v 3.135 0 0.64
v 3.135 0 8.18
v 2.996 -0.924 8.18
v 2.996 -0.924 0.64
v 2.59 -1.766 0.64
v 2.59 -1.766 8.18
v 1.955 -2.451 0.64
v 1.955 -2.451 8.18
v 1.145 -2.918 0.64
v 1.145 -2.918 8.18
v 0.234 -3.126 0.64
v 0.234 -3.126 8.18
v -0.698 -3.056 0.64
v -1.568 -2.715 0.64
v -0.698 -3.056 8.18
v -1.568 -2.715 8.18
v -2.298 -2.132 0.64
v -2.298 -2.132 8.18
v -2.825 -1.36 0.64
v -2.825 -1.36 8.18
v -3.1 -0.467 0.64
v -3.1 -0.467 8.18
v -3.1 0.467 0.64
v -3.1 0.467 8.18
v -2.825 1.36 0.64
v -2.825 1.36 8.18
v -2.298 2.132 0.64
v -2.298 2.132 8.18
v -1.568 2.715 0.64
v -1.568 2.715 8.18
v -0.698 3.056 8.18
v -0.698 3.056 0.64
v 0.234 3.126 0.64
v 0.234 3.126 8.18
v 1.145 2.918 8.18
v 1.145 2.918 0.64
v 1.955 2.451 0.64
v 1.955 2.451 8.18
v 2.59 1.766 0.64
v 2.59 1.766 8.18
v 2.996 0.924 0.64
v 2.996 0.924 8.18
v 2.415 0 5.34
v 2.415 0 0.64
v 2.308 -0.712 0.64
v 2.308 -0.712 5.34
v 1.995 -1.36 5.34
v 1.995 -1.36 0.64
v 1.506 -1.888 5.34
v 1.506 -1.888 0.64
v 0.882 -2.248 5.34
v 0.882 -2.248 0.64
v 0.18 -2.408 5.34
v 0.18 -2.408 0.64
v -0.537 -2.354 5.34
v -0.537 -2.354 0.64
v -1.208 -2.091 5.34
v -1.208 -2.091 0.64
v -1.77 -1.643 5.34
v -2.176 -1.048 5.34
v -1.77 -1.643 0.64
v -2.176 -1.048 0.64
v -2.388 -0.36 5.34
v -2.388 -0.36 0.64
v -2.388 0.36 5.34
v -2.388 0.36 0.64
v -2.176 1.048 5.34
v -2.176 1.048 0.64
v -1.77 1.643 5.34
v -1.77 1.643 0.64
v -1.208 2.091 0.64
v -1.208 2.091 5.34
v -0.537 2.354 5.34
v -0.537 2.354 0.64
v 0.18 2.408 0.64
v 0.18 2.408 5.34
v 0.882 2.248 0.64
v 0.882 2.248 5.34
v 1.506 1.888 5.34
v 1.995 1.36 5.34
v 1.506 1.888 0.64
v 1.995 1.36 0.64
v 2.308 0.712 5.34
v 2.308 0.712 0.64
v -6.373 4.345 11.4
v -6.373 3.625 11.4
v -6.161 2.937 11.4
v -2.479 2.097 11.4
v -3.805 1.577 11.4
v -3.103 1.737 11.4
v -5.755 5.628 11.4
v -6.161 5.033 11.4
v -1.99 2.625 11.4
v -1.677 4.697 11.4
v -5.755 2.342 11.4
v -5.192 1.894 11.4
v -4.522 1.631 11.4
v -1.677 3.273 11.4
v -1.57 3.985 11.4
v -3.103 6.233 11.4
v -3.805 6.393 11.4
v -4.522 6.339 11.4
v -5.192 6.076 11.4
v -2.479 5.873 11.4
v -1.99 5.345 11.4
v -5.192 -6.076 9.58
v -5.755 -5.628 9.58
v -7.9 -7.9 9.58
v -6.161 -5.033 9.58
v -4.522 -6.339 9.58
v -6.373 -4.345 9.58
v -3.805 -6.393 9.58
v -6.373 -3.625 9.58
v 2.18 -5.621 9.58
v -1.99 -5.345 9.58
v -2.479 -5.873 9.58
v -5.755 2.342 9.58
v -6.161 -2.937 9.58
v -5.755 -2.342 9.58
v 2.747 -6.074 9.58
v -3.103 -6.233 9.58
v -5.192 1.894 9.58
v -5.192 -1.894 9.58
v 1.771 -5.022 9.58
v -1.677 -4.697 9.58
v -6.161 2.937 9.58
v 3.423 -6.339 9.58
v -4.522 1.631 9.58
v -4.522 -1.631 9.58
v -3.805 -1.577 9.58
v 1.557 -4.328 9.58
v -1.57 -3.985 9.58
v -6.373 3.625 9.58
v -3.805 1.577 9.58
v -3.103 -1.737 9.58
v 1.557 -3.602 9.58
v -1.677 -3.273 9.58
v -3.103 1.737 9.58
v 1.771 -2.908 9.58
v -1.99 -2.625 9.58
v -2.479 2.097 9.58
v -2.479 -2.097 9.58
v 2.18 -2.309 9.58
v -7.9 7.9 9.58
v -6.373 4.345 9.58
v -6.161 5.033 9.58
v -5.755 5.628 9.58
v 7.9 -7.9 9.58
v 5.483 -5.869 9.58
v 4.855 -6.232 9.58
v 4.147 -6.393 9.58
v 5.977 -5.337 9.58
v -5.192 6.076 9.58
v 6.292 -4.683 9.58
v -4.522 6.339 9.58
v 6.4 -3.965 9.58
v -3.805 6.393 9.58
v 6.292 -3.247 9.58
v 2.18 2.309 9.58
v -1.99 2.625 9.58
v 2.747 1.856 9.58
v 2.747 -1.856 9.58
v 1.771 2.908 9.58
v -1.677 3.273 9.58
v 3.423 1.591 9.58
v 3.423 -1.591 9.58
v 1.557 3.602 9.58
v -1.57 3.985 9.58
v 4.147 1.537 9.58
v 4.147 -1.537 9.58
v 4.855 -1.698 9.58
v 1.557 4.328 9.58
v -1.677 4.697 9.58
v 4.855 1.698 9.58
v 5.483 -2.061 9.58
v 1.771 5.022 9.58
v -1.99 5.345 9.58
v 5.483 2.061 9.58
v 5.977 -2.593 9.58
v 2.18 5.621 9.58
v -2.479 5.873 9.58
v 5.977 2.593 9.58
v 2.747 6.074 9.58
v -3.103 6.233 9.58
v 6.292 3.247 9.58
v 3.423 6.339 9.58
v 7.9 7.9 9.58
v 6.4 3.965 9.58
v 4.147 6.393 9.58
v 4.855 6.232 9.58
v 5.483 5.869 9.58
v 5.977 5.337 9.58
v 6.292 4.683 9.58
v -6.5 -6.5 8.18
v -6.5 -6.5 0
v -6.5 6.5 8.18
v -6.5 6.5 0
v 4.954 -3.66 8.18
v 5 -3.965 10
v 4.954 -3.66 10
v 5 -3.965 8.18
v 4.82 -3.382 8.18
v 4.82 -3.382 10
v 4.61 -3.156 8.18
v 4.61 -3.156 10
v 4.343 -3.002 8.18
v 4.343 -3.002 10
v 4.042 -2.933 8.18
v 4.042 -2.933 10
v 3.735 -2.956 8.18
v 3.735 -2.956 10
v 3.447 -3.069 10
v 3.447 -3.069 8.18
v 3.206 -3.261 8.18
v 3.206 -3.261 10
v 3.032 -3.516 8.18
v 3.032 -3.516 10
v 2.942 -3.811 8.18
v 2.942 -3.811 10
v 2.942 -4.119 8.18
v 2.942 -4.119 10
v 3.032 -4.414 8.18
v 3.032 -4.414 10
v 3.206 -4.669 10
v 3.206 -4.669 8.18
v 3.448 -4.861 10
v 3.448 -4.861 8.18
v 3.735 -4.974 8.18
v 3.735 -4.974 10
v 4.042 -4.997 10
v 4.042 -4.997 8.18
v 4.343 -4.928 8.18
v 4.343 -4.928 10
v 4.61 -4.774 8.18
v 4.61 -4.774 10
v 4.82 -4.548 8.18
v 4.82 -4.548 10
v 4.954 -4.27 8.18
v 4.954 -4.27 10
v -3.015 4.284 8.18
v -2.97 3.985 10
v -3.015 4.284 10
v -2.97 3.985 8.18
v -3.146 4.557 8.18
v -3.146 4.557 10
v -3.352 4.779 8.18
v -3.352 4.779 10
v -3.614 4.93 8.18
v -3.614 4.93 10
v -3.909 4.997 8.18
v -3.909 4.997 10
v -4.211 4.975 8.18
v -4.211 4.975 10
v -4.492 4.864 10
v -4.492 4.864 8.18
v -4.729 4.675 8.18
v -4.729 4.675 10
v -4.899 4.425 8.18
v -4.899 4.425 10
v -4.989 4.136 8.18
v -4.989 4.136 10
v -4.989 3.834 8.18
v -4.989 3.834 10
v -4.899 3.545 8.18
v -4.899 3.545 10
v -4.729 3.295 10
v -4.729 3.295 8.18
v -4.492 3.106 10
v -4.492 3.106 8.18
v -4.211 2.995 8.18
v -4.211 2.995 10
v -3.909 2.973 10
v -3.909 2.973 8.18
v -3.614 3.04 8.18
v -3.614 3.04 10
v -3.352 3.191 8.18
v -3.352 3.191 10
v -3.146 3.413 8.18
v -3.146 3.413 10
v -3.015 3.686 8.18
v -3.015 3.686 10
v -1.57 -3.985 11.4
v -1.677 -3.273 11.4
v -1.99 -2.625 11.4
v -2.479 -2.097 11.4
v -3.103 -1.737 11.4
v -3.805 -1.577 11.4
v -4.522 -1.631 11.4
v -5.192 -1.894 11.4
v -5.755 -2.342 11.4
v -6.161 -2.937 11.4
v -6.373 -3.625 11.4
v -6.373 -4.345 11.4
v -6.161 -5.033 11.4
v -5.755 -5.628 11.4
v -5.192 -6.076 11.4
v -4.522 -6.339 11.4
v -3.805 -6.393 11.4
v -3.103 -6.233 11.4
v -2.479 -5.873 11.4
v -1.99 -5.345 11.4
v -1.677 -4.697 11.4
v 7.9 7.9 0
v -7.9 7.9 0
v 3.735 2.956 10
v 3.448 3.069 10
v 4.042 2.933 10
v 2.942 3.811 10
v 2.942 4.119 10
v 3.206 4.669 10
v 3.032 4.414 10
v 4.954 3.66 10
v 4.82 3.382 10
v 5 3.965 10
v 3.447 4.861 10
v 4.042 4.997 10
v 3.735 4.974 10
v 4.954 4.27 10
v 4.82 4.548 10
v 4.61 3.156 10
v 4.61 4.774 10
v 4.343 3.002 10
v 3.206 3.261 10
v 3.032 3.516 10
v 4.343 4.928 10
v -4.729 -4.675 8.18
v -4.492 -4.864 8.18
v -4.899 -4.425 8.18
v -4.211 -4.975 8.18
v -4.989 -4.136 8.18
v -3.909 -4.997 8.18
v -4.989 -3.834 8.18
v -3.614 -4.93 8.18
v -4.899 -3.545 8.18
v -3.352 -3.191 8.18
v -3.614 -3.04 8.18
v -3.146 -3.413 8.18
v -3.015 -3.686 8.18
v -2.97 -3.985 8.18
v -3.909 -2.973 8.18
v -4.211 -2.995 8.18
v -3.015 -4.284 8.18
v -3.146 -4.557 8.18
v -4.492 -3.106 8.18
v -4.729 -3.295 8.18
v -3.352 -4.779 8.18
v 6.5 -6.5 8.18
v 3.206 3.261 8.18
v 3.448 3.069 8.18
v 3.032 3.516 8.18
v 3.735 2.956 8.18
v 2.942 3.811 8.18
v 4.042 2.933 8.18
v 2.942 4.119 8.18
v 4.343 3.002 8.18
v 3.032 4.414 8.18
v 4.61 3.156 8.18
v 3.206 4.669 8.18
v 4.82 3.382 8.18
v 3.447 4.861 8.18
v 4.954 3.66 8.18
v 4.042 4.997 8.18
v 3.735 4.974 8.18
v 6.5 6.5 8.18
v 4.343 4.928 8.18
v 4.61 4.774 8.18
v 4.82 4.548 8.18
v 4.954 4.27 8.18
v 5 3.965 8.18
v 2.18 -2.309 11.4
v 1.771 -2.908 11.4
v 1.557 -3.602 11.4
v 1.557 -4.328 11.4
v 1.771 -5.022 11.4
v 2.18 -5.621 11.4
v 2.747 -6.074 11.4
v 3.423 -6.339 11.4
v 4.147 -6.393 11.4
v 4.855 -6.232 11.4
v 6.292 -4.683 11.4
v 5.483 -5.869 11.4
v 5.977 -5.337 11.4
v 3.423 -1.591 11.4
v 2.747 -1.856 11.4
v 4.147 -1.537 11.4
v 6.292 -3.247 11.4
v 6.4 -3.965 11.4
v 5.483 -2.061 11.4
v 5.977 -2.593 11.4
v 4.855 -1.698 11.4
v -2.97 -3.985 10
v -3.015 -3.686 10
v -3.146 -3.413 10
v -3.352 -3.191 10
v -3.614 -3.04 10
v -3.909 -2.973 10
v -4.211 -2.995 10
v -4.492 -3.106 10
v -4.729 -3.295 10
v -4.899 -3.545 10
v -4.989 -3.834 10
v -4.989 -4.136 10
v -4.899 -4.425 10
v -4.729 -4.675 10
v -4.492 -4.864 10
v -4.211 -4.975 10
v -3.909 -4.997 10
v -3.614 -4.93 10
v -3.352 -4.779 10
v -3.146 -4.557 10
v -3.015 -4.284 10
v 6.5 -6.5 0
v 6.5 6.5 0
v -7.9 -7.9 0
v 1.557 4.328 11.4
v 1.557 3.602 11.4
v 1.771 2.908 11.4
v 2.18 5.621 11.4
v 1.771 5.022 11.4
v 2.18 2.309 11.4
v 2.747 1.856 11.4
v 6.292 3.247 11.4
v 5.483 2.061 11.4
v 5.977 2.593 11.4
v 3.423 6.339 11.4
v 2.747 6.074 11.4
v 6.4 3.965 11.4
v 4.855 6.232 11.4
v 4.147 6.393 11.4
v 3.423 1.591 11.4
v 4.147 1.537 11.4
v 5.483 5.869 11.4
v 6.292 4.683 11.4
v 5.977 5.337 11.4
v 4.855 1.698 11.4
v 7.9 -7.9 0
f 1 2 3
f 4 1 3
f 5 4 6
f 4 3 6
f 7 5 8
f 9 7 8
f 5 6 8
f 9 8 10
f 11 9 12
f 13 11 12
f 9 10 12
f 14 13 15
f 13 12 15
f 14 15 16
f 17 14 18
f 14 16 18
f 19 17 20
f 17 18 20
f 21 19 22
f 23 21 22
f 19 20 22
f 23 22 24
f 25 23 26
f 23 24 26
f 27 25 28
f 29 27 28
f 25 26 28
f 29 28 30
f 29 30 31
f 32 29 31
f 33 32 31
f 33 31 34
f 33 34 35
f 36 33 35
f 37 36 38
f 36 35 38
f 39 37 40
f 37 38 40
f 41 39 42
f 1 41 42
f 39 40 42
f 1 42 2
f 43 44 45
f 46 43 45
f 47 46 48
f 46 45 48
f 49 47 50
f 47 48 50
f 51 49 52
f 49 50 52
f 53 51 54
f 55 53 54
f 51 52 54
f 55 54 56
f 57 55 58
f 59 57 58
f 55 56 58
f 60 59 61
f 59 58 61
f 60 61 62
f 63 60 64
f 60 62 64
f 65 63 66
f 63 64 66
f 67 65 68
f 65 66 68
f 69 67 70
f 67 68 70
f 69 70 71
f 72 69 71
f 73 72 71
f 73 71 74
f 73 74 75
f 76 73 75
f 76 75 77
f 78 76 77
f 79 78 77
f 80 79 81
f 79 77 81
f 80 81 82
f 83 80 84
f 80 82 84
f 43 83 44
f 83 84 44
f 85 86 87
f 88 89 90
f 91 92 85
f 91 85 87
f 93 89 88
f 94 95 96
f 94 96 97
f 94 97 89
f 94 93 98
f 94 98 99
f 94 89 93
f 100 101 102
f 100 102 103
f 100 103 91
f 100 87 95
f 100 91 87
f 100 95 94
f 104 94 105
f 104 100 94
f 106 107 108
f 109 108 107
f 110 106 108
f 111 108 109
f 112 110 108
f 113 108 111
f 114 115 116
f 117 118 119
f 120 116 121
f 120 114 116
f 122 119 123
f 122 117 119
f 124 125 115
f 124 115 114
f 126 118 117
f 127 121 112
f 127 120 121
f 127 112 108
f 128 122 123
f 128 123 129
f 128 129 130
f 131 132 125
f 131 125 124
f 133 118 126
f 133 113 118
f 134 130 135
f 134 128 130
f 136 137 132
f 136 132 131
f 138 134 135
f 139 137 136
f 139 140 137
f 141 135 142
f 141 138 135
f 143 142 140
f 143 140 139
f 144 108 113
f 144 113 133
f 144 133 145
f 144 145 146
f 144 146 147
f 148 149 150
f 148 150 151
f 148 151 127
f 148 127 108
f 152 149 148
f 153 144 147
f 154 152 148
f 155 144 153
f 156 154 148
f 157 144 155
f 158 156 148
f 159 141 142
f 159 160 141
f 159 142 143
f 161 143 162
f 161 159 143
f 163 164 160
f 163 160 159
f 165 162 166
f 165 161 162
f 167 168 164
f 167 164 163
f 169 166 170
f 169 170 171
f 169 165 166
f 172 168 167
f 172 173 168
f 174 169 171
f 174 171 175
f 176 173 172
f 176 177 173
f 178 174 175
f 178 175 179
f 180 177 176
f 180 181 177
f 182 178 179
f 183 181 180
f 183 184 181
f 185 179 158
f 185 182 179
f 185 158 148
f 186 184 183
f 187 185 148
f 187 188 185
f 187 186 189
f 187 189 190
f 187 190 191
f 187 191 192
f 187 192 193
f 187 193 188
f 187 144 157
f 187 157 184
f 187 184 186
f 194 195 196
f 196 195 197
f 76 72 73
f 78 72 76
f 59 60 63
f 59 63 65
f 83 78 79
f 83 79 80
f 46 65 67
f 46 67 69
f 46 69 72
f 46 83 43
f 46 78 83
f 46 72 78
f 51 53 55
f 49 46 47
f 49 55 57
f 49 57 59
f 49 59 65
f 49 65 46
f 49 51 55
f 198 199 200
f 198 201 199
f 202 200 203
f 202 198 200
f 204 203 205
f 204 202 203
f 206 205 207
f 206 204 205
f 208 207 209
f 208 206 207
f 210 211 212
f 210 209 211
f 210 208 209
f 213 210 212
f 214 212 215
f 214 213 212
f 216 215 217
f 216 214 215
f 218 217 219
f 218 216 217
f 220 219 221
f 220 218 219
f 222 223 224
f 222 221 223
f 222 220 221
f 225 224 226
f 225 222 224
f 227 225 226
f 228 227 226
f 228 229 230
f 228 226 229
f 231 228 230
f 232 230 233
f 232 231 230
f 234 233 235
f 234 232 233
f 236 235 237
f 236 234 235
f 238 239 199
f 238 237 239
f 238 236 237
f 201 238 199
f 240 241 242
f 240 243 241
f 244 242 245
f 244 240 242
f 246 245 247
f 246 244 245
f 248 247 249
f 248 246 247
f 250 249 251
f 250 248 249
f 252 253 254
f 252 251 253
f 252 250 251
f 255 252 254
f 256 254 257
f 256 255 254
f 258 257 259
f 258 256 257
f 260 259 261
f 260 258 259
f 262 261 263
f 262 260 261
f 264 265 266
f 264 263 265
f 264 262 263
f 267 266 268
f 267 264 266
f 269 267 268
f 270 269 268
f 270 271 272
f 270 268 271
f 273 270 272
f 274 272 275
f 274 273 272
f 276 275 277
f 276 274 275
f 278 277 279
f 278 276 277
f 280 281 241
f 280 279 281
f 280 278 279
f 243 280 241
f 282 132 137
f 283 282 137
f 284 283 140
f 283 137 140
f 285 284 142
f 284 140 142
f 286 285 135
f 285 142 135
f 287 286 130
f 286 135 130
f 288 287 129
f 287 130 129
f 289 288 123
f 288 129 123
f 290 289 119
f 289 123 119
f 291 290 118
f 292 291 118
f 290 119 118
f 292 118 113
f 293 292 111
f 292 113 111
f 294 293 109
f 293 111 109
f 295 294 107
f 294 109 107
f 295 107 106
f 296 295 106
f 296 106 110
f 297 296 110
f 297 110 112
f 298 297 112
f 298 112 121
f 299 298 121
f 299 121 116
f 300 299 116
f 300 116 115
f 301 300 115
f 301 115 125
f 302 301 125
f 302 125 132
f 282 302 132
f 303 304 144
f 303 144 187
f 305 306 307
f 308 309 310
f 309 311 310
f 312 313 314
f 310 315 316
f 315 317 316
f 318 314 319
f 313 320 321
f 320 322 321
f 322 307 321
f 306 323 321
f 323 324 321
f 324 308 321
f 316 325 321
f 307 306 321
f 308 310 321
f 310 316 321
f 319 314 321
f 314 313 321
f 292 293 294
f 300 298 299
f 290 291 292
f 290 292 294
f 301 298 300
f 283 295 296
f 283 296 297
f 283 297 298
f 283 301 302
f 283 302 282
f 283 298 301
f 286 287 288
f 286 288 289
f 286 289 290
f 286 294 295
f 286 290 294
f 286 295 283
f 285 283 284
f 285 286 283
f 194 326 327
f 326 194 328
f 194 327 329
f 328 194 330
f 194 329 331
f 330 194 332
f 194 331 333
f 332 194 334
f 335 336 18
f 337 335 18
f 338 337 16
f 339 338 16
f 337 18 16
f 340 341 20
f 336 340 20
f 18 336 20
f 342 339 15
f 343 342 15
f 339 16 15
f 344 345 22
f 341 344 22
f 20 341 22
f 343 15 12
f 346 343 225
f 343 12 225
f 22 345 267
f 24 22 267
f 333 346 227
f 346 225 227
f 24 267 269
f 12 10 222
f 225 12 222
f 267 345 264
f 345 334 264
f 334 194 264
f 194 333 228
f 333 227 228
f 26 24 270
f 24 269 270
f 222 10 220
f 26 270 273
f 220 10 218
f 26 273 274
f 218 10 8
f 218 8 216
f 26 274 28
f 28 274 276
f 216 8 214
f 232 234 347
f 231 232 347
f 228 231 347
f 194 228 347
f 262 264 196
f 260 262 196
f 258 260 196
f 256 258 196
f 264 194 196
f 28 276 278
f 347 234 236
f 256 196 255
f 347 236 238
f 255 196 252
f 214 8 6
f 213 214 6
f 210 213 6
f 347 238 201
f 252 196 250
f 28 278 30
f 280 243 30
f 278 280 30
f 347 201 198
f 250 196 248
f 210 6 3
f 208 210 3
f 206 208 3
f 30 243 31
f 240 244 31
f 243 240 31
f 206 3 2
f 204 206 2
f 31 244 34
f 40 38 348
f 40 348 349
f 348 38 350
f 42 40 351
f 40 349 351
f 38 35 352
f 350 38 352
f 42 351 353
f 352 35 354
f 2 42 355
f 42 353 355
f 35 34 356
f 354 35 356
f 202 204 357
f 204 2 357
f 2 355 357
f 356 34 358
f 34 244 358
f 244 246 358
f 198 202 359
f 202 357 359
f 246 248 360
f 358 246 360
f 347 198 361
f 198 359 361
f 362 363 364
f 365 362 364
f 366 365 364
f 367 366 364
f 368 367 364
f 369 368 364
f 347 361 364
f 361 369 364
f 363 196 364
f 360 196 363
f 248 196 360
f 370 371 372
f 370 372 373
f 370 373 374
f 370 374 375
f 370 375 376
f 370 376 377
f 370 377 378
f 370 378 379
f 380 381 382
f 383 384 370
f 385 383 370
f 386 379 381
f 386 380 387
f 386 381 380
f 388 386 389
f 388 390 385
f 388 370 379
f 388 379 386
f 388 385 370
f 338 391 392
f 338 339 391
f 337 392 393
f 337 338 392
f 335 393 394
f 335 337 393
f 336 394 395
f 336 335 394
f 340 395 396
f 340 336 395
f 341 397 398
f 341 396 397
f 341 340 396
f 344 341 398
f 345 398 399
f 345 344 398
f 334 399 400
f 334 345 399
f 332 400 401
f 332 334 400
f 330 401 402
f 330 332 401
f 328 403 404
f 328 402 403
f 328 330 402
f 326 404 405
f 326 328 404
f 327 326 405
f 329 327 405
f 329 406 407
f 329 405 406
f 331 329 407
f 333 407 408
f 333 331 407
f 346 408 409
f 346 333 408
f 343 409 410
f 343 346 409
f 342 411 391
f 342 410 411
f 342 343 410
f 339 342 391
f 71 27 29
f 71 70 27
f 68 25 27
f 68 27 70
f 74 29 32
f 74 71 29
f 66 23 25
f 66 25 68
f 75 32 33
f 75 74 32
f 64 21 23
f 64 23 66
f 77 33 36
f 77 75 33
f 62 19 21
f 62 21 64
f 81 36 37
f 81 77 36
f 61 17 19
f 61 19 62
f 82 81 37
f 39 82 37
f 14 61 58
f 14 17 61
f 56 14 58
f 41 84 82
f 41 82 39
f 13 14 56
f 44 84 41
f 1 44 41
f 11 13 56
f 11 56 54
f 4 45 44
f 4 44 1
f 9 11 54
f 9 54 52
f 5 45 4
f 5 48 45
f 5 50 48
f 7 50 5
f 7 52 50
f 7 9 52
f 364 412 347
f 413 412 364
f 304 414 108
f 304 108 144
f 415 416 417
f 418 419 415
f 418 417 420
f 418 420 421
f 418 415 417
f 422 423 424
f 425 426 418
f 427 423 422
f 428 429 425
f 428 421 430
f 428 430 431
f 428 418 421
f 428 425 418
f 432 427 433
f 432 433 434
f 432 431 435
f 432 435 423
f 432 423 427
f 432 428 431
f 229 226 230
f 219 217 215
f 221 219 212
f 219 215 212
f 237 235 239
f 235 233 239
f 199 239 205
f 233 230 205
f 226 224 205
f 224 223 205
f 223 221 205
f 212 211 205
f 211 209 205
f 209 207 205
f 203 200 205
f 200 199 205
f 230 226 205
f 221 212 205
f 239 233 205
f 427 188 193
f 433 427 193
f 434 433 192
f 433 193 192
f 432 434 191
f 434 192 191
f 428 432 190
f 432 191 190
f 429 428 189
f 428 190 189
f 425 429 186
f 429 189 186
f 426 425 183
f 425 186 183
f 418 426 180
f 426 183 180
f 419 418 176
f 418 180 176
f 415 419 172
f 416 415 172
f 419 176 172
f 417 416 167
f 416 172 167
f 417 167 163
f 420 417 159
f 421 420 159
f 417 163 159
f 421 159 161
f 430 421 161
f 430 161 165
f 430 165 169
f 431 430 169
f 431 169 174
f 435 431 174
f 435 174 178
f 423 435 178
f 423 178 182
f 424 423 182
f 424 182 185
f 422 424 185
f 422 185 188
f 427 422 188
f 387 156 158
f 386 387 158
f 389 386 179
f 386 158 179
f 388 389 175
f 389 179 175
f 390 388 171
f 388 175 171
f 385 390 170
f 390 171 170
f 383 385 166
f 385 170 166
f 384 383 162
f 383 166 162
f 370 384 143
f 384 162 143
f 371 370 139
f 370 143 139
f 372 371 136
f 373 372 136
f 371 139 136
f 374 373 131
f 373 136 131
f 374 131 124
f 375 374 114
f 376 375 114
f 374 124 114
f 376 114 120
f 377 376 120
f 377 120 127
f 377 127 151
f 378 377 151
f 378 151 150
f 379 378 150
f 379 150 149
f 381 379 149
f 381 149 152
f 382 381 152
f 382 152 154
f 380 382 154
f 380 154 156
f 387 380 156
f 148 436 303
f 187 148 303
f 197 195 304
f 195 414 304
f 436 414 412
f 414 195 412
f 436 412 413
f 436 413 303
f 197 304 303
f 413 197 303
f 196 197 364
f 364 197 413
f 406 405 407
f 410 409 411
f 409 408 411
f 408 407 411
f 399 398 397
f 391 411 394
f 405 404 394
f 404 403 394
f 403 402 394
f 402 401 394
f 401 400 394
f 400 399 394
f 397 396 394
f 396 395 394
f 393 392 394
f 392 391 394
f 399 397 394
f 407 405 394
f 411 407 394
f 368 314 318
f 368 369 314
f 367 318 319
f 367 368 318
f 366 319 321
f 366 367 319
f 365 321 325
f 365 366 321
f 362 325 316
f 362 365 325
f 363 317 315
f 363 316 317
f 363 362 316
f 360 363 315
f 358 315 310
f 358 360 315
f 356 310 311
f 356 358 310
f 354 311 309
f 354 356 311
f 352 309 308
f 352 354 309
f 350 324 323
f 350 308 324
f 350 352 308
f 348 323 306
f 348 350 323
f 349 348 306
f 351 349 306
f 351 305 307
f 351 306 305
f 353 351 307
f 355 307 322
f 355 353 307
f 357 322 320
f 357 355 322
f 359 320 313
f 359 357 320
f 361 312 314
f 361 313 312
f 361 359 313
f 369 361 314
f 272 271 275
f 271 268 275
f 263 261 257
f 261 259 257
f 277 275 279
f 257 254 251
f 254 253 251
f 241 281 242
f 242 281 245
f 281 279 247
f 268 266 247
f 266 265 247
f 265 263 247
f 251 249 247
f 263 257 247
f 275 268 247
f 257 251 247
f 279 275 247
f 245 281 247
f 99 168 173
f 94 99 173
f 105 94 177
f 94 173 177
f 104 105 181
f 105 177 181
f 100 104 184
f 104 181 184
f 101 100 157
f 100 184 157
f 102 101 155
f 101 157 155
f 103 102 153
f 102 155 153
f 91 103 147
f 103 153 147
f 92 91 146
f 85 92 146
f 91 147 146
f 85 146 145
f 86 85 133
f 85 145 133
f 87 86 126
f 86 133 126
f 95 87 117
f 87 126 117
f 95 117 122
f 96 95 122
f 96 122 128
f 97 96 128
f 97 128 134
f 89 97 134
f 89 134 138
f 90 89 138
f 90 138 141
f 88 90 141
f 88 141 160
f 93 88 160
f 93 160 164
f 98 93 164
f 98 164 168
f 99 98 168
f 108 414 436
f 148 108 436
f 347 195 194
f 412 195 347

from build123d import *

# Parameters (mm, degrees)
F1_W     = 15.8
F1_H     = 15.8
F2_DEPTH = 9.58
F0_R     = 2.4150125628
F0_R_2   = 2.435
F3_DEPTH = 11.4
F4_T     = -1.4
F5_R     = 3.135
F6_DEPTH = 7.54
F7_R     = 2.415
F8_DEPTH = 4.7


with BuildPart() as f2:
    # F1 (on Top) → F2 (new body)
    with BuildSketch(Plane.XY):
        Rectangle(F1_W, F1_H)
    extrude(amount=F2_DEPTH)

    # F0 (on Top) → F3 (join)
    with BuildSketch(Plane.XY):
        with Locations((-3.9849874372, 3.9849874372)):
            Circle(F0_R)
        with Locations((3.965, 3.965)):
            Circle(F0_R_2)
        with Locations((3.965, -3.965)):
            Circle(F0_R_2)
        with Locations((-3.9849874372, -3.9849874372)):
            Circle(F0_R)
    extrude(amount=F3_DEPTH)

    # F4
    f4_openings = [f2.faces().sort_by_distance(p)[0] for p in [
        (0, 0, 0),
    ]]
    offset(amount=F4_T, openings=f4_openings, kind=Kind.INTERSECTION)

    # F5 (on face) → F6 (join)
    with BuildSketch(Plane(origin=(0, 0, 8.18), x_dir=(1, 0, 0), z_dir=(0, 0, -1))):
        Circle(F5_R)
    extrude(amount=F6_DEPTH)

    # F7 (on face) → F8 (cut)
    with BuildSketch(Plane(origin=(0, 0, 0.64), x_dir=(1, 0, 0), z_dir=(0, 0, -1))):
        Circle(F7_R)
    extrude(amount=-F8_DEPTH, mode=Mode.SUBTRACT)


solid = f2.part
